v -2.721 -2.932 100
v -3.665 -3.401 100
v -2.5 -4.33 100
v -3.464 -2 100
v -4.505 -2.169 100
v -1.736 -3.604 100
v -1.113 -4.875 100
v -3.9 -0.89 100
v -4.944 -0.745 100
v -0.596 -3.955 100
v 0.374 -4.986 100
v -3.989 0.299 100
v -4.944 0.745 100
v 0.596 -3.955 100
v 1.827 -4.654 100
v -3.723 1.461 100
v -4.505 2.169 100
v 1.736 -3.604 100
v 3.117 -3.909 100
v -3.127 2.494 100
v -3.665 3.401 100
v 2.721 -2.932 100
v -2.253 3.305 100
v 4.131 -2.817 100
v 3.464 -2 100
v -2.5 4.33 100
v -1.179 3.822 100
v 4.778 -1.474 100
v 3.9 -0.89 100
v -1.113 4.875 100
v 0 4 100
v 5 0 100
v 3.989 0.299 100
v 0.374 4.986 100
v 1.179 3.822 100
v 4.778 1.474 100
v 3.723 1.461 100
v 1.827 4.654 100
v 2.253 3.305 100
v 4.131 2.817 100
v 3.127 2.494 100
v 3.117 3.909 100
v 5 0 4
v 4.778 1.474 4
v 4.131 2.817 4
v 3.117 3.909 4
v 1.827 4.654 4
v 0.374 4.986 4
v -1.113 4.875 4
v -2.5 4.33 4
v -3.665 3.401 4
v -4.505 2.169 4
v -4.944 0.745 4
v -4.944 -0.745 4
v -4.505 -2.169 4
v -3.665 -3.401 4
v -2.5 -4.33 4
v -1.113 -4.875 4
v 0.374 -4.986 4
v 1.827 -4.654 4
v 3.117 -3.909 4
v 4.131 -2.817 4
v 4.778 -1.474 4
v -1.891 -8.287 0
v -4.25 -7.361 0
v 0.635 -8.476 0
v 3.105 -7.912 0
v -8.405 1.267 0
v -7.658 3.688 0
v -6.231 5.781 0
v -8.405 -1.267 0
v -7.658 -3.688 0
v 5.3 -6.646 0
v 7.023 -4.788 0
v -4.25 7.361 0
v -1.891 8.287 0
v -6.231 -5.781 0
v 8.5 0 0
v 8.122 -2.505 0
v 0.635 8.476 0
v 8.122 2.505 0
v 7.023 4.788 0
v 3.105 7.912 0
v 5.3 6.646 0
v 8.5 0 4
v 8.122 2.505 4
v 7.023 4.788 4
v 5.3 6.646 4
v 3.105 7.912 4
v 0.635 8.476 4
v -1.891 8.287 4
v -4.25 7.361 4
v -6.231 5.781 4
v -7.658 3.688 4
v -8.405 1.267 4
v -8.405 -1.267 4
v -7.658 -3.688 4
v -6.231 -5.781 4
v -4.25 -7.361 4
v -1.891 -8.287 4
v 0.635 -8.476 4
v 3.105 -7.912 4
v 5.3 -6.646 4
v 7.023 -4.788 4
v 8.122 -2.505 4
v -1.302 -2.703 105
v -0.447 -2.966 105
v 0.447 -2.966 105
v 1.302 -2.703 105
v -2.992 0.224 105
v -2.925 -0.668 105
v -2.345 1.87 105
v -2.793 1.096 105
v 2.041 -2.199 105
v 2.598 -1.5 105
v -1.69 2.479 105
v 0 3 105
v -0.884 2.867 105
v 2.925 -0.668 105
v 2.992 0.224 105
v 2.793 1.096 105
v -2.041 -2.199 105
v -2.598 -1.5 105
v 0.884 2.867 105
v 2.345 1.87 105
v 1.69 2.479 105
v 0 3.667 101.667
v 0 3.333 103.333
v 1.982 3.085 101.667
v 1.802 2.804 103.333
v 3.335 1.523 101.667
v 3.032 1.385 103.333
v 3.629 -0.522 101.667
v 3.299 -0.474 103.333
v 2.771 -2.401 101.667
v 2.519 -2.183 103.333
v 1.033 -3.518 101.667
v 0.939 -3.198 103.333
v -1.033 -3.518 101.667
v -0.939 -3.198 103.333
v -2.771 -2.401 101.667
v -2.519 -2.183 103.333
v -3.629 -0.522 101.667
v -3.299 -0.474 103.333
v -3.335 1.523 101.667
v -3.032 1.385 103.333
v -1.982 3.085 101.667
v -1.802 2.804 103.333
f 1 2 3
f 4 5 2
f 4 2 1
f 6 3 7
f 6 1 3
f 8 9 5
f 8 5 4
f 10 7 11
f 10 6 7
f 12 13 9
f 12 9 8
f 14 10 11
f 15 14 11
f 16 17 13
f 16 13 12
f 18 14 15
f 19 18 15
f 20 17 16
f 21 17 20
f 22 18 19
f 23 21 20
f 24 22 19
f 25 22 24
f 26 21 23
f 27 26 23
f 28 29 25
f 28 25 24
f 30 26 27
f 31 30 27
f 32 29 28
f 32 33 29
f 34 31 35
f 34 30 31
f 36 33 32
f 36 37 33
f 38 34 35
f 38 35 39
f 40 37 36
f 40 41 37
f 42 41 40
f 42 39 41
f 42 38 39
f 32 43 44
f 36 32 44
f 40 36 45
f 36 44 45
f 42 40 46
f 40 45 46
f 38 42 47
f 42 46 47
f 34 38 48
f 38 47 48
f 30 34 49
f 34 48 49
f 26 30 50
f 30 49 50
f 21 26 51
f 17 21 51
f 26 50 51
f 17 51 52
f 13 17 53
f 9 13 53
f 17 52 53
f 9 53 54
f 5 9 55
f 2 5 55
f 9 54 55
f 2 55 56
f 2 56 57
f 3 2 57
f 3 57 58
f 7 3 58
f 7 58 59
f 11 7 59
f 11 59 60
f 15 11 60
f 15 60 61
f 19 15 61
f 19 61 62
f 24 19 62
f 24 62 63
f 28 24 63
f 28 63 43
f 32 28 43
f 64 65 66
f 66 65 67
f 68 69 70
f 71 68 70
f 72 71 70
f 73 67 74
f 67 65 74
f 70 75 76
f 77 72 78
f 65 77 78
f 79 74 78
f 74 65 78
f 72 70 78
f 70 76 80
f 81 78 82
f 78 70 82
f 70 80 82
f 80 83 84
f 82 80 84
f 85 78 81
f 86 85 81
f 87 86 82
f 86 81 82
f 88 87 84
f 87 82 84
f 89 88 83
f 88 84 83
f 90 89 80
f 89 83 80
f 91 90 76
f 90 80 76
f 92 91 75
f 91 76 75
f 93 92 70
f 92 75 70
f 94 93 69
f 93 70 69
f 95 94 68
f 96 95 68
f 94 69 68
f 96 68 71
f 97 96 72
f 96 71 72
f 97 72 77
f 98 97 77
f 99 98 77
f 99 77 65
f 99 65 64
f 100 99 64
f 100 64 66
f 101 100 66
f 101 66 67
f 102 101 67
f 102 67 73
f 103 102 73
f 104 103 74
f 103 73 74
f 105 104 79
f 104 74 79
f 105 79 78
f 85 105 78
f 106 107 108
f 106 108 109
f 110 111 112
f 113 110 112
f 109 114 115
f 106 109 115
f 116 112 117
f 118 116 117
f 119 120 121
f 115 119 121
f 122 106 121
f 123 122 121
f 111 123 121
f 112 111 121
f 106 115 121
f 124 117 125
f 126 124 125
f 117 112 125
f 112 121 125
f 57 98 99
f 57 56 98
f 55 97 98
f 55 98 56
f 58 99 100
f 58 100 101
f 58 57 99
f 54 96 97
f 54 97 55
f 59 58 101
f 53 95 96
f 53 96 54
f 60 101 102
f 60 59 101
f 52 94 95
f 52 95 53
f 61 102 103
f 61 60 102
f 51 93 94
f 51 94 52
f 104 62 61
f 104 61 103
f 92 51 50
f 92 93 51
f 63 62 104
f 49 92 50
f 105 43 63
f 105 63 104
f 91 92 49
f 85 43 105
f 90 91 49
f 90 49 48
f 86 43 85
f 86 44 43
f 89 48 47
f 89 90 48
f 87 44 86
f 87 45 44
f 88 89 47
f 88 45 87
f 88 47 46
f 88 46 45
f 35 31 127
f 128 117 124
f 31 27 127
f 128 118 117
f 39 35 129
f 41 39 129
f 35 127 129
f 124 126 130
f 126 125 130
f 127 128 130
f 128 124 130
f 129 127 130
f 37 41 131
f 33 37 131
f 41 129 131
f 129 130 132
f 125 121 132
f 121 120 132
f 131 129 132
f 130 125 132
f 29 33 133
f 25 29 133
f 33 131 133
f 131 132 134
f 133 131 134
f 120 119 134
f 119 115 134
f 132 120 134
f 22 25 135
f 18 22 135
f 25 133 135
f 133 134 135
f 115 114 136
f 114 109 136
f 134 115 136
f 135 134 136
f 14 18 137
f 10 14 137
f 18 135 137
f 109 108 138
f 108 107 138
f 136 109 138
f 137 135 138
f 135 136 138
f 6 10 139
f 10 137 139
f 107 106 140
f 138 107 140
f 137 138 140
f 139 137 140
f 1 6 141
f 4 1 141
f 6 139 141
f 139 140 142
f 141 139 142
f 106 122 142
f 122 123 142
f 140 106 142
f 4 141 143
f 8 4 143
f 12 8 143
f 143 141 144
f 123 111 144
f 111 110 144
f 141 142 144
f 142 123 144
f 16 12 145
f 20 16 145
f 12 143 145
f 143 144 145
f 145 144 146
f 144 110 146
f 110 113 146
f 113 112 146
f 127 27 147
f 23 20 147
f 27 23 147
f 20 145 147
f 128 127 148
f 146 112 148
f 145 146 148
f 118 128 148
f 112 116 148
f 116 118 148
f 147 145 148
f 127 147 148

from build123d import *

# Parameters (mm, degrees)
F0_R     = 8.5
F1_DEPTH = 4
F2_R     = 5
F3_DEPTH = 100


with BuildPart() as f1:
    # F0 (on Top) → F1 (new body)
    with BuildSketch(Plane.XY):
        Circle(F0_R)
    extrude(amount=F1_DEPTH)

    # F2 (on Top) → F3 (join)
    with BuildSketch(Plane.XY):
        Circle(F2_R)
    extrude(amount=F3_DEPTH)

    # F4 (on Right) → F5 (revolve)
    with BuildSketch(Plane.YZ):
        Polygon((3, 105), (0, 105), (0, 100), (4, 100), align=None)
    revolve(axis=Axis((0, 0, 102.5), (0, 0, -1)))


solid = f1.part
